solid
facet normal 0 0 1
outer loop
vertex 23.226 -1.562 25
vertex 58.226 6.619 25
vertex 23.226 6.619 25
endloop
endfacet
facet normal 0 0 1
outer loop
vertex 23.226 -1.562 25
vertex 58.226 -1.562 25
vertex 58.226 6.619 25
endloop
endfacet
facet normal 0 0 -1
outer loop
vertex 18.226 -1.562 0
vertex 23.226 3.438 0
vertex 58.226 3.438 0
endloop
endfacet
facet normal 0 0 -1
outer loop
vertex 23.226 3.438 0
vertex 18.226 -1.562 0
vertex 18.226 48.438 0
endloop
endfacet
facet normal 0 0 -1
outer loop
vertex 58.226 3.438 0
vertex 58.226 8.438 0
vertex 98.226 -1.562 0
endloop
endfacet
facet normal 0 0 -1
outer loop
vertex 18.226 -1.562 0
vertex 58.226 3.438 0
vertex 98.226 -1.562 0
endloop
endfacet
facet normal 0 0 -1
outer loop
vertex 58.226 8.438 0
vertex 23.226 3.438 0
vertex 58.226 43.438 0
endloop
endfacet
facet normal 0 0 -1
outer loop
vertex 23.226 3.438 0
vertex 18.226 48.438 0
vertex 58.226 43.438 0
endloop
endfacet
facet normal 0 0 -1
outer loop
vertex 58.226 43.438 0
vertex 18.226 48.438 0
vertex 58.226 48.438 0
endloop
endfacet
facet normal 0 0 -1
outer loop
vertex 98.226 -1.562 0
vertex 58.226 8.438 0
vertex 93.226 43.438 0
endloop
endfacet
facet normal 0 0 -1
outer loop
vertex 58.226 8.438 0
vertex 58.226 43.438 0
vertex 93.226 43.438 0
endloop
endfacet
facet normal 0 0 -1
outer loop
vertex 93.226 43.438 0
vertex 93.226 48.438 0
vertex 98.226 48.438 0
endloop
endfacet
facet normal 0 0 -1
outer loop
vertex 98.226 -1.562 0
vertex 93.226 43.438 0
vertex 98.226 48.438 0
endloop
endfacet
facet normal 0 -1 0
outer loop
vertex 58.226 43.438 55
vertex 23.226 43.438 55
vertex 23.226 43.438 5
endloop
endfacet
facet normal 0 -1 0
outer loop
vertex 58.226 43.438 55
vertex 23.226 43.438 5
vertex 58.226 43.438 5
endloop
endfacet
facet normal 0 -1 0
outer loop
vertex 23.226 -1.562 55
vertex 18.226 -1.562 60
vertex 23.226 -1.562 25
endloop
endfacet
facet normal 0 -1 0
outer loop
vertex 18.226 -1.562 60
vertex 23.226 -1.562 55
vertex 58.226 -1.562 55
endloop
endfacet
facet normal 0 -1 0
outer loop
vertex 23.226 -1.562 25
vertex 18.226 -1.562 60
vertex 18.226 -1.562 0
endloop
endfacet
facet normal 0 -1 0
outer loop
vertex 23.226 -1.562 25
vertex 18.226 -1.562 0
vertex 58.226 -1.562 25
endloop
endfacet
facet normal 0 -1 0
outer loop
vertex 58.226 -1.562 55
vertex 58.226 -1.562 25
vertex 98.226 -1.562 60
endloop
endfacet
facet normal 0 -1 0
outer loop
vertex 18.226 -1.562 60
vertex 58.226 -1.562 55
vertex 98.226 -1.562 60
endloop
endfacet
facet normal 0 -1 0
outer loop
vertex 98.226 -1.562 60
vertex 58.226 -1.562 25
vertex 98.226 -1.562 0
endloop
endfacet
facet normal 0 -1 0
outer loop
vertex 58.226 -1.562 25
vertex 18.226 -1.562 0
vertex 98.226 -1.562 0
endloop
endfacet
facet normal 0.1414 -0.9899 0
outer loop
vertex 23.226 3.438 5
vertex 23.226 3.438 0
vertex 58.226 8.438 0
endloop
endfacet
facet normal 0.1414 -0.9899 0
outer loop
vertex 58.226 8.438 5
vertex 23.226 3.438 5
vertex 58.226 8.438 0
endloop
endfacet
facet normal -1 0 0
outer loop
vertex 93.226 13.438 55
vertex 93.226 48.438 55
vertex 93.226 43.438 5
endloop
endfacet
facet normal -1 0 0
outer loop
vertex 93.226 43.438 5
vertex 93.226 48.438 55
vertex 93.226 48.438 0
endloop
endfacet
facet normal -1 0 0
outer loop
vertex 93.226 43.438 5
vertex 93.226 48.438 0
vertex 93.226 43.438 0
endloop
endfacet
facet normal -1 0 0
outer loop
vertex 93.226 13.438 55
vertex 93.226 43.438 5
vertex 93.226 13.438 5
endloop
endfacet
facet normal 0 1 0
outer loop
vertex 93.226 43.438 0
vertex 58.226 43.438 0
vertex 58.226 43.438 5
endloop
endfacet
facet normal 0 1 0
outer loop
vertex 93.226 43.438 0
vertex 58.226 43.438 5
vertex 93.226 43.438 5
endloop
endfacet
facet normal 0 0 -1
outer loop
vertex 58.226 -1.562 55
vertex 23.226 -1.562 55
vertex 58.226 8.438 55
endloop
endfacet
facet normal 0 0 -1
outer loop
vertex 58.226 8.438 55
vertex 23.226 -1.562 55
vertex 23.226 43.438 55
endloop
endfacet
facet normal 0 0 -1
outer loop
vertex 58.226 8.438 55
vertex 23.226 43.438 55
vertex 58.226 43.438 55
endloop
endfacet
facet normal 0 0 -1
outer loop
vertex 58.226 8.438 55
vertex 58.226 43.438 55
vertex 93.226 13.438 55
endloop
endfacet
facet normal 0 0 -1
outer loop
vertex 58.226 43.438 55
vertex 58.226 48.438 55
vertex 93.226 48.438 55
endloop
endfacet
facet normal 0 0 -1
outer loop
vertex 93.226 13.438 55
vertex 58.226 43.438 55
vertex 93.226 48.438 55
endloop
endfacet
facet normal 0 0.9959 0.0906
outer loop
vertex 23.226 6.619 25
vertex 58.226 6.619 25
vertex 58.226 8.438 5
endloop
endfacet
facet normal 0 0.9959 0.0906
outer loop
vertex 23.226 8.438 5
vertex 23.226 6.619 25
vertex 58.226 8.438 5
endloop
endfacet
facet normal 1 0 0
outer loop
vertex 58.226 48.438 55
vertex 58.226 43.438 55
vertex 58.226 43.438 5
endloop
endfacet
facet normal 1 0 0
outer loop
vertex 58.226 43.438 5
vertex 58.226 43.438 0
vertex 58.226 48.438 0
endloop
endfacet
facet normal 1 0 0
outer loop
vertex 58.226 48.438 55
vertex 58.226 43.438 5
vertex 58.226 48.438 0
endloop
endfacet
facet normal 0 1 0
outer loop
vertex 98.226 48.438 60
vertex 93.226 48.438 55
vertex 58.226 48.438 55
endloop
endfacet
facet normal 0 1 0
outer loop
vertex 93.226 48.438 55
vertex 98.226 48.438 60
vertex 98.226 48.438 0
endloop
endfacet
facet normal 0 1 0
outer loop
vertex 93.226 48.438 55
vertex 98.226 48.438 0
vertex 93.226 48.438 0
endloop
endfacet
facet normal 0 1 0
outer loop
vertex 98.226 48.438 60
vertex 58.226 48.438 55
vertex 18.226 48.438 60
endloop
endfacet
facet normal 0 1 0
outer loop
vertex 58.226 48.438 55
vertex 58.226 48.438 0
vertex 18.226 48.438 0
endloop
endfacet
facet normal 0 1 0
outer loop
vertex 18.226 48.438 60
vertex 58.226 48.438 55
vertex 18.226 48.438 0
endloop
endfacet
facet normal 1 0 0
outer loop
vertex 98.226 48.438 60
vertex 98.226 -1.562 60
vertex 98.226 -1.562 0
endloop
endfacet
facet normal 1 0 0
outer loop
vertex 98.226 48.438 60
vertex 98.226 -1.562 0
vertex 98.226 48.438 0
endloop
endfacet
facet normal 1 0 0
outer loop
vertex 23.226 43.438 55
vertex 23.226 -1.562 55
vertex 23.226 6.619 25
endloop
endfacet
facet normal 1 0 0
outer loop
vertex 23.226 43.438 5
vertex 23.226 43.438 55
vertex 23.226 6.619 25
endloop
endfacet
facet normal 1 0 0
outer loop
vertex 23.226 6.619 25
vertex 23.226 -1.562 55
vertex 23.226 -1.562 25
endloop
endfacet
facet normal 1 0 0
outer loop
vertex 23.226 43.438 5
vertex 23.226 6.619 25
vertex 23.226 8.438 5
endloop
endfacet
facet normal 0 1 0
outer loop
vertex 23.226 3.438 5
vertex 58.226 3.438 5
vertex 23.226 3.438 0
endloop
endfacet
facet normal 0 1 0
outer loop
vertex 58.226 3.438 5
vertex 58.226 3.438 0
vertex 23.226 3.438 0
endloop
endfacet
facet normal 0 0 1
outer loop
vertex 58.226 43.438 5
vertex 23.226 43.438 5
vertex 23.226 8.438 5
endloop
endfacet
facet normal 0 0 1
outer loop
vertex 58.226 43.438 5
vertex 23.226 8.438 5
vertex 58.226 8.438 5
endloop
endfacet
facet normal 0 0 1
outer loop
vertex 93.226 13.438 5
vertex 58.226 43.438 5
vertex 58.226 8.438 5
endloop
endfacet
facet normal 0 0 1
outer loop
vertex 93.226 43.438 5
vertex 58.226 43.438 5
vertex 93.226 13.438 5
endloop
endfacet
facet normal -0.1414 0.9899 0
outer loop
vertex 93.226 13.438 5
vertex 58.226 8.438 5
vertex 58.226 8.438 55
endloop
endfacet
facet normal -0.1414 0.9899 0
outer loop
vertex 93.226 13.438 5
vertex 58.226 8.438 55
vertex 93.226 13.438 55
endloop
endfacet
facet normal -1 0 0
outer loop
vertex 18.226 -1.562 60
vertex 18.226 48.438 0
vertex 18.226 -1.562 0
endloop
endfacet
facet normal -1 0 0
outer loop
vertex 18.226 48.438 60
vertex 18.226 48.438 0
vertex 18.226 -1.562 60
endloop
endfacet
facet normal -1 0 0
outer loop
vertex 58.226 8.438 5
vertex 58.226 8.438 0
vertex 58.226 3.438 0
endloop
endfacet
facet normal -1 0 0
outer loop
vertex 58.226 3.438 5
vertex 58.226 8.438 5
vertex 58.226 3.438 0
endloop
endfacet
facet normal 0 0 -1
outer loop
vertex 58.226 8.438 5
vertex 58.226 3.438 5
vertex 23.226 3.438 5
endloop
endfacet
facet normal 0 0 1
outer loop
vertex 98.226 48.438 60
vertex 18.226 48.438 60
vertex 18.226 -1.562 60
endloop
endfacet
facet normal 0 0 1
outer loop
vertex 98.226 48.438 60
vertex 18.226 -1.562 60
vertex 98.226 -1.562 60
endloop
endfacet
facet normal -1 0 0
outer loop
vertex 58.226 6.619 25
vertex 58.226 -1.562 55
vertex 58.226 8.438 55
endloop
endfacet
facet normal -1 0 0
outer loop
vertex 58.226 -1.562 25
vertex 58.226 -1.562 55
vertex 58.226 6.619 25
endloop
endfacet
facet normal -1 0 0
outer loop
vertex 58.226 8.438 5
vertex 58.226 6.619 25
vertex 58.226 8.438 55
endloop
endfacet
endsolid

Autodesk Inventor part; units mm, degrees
ref_plane "YZ Plane" through (0, 0, 0) normal (1, 0, 0) x (0, 1, 0)
ref_plane "XZ Plane" through (0, 0, 0) normal (0, 1, 0) x (-1, 0, 0)
ref_plane "XY Plane" through (0, 0, 0) normal (0, 0, 1) x (1, 0, 0)
sketch "Sketch1" plane through (0, 0, 0) normal (0, 0, 1) x (1, 0, 0)
  line L0 (23.2261, 43.4376) -> (23.2261, 3.4376)
  line L1 (23.2261, 43.4376) -> (93.2261, 43.4376)
  line L2 (93.2261, 43.4376) -> (93.2261, 3.4376)
  line L3 (93.2261, 3.4376) -> (23.2261, 3.4376)
  line L4 (23.2261, 3.4376) -> (93.2261, 13.4376)
  line L5 (58.2261, 8.4376) -> (58.2261, 3.4376)
  line L6 (98.2261, 48.4376) -> (18.2261, 48.4376)
  line L7 (18.2261, 48.4376) -> (18.2261, -1.5624)
  line L8 (18.2261, -1.5624) -> (98.2261, -1.5624)
  line L9 (98.2261, -1.5624) -> (98.2261, 48.4376)
  line L10 (23.2261, 43.4376) -> (23.2261, 48.4376)
  line L11 (93.2261, 43.4376) -> (93.2261, 48.4376)
  line L12 (58.2261, 43.4376) -> (58.2261, 48.4376)
  point P0 (0, 0)
  dimension "d0" = 40
  dimension "d1" = 70
  dimension "d2" = 10
  dimension "d4" = 5
  dimension "d5" = 5
  dimension "d16" = 35
extrude "Extrusion1" add sketch "Sketch1" along normal blind 60 contours L10 L6 L12 L1 | L0 L3 L2 L11 L6 L9 L8 L7 L10
extrude "Extrusion2" add sketch "Sketch1" along normal blind 5 contours L1 L2 L4 L0
extrude "Extrusion3" add sketch "Sketch1" along normal blind 60 contours L5 L4 L2 L3
sketch "Sketch2" plane through (18.2261, -1.5624, 0) normal (-1, 0, 0) x (0, 0, 1)
  line L0 (60, 0) -> (60, 50) projected
  line L1 (60, 0) -> (60, 5)
  line L2 (5, 10) -> (60, 10) projected
  line L3 (60, 5) -> (5, 10)
  line L4 (5, 5) -> (5, 45) projected
  line L5 (5, 5) -> (5, 10)
  line L6 (5, 5) -> (60, 5)
  point P0 (0, 1.5624)
  dimension "d12" = 5
extrude "Extrusion4" add sketch "Sketch2" against normal blind 45 contours L6 L4 L3
sketch "Sketch3" plane through (0, 0, 60) normal (0, 0, 1) x (1, 0, 0)
  line L0 (18.2261, 48.4376) -> (18.2261, -1.5624) projected
  line L1 (18.2261, -1.5624) -> (98.2261, -1.5624) projected
  line L2 (18.2261, 48.4376) -> (98.2261, 48.4376)
  line L3 (98.2261, 48.4376) -> (98.2261, -1.5624)
  line L4 (98.2261, -1.5624) -> (18.2261, -1.5624)
  line L5 (18.2261, -1.5624) -> (18.2261, 48.4376)
  point P0 (0, 0)
extrude "Extrusion5" add sketch "Sketch3" against normal blind 5
sketch "Sketch4" plane through (18.2261, -1.5624, 0) normal (0, -1, 0) x (1, 0, 0)
  line L0 (0, 0) -> (0, 60) projected
  line L1 (0, 60) -> (40, 60)
  line L2 (40, 60) -> (40, 25)
  line L3 (40, 25) -> (0, 25)
  line L4 (0, 25) -> (0, 60)
  line L5 (5, 55) -> (5, 5) projected
  line L6 (5, 25) -> (5, 55)
  line L7 (5, 55) -> (40, 55)
  point P0 (-18.2261, 0)
  point P1 (0, 25)
  dimension "d19" = 40
  dimension "d20" = 35
extrude "Extrusion6" cut sketch "Sketch4" against normal blind 10 contours L5 L7 L2 L3
properties part number "leftcollection"
